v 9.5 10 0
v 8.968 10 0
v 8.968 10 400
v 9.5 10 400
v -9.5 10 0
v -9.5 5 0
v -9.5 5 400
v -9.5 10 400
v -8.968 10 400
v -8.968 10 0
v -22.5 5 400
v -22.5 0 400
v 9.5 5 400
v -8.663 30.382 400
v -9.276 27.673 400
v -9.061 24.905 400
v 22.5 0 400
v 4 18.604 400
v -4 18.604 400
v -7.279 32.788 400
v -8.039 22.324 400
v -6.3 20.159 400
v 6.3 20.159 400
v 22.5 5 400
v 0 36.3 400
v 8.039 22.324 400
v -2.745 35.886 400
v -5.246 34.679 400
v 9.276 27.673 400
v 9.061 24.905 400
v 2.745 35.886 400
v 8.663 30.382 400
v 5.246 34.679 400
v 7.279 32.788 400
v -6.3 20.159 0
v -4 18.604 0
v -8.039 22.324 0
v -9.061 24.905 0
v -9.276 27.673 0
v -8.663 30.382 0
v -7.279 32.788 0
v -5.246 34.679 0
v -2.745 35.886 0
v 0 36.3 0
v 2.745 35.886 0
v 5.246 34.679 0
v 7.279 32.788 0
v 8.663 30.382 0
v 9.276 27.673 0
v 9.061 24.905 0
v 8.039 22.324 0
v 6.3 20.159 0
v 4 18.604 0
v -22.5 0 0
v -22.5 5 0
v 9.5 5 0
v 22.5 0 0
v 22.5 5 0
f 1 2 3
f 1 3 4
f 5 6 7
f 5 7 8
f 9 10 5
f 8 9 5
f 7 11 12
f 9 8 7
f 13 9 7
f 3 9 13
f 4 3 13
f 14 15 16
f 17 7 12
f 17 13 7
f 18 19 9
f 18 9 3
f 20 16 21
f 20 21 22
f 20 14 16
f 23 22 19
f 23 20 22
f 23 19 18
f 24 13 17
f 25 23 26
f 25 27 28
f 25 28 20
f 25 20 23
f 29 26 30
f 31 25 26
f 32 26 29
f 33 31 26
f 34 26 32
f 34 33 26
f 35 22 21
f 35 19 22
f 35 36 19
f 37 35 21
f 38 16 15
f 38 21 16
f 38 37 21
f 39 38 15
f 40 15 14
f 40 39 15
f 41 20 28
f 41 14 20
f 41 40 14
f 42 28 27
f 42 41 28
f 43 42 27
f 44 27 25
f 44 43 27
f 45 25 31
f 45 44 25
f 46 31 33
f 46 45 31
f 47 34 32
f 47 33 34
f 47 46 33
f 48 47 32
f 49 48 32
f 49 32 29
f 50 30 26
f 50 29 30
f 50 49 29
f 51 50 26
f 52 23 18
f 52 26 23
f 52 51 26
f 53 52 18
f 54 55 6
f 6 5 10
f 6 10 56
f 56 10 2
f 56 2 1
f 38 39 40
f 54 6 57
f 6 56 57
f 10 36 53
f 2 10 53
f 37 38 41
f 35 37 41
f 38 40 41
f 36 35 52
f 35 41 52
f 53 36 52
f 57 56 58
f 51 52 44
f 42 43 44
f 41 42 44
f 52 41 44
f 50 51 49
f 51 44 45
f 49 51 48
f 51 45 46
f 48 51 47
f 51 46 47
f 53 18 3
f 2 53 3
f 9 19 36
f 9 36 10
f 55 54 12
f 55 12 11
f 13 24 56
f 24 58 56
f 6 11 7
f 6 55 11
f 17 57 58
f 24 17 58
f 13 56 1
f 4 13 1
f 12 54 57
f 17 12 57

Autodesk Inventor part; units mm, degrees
ref_plane "YZ Plane" through (0, 0, 0) normal (1, 0, 0) x (0, 1, 0)
ref_plane "XZ Plane" through (0, 0, 0) normal (0, 1, 0) x (-1, 0, 0)
ref_plane "XY Plane" through (0, 0, 0) normal (0, 0, 1) x (1, 0, 0)
sketch "Sketch1" plane through (0, 0, 0) normal (0, 0, 1) x (1, 0, 0)
  line L0 (-22.5, 0) -> (22.5, 0)
  line L1 (22.5, 0) -> (22.5, 5)
  line L2 (-22.5, 0) -> (-22.5, 5)
  line L3 (-22.5, 5) -> (-9.5, 5)
  line L4 (22.5, 5) -> (9.5, 5)
  line L5 (-9.5, 5) -> (-9.5, 10)
  line L6 (9.5, 5) -> (9.5, 10)
  arc A0 (4, 18.6042) -> (-4, 18.6042) centre (0, 27) ccw
  line L7 (4, 18.6042) -> (8.9676, 10)
  line L8 (-4, 18.6042) -> (-8.9676, 10)
  line L9 (-9.5, 10) -> (9.5, 10) construction
  line L10 (-8.9676, 10) -> (-9.5, 10) construction
  line L11 (-8.9676, 10) -> (-9.5, 10)
  line L12 (8.9676, 10) -> (9.5, 10)
  line L13 (-11.4601, 5) -> (-11.4601, 0) construction
  line L14 (-16.9601, 5) -> (-16.9601, 0) construction
  line L15 (13.0399, 5) -> (13.0399, 0) construction
  line L16 (18.5399, 5) -> (18.5399, 0) construction
  arc A1 (-4, 18.6042) -> (4, 18.6042) centre (0, 27) ccw construction
  point P0 (0, 0)
  point P1 (0, 0)
  point P2 (0, 17.7)
  point P3 (15.7899, 5)
  point P4 (-14.2101, 5)
  dimension "B" = 45
  dimension "t" = 5
  dimension "d2" = 5
  dimension "dimensionf" = 19
  dimension "d4" = 13
  dimension "Y" = 10
  dimension "d6" = 5
  dimension "d" = 18.6
  dimension "e" = 22.5
  dimension "dimensionH" = 17.7
  dimension "dimensionh" = 27
  dimension "x" = 8
  dimension "d16" = 4
  dimension "dimensionc" = 30
  dimension "d21" = 6.7101
  dimension "s1" = 5.5
  dimension "d23" = 5.5
  dimension "d24" = 2.75
  dimension "d25" = 2.75
extrude "Extrusion1" add sketch "Sketch1" along normal blind 400
equation "\"d2\" = t"
equation "\"d16\" = 0.5 * x"
properties part number "sbr20_400mm"
